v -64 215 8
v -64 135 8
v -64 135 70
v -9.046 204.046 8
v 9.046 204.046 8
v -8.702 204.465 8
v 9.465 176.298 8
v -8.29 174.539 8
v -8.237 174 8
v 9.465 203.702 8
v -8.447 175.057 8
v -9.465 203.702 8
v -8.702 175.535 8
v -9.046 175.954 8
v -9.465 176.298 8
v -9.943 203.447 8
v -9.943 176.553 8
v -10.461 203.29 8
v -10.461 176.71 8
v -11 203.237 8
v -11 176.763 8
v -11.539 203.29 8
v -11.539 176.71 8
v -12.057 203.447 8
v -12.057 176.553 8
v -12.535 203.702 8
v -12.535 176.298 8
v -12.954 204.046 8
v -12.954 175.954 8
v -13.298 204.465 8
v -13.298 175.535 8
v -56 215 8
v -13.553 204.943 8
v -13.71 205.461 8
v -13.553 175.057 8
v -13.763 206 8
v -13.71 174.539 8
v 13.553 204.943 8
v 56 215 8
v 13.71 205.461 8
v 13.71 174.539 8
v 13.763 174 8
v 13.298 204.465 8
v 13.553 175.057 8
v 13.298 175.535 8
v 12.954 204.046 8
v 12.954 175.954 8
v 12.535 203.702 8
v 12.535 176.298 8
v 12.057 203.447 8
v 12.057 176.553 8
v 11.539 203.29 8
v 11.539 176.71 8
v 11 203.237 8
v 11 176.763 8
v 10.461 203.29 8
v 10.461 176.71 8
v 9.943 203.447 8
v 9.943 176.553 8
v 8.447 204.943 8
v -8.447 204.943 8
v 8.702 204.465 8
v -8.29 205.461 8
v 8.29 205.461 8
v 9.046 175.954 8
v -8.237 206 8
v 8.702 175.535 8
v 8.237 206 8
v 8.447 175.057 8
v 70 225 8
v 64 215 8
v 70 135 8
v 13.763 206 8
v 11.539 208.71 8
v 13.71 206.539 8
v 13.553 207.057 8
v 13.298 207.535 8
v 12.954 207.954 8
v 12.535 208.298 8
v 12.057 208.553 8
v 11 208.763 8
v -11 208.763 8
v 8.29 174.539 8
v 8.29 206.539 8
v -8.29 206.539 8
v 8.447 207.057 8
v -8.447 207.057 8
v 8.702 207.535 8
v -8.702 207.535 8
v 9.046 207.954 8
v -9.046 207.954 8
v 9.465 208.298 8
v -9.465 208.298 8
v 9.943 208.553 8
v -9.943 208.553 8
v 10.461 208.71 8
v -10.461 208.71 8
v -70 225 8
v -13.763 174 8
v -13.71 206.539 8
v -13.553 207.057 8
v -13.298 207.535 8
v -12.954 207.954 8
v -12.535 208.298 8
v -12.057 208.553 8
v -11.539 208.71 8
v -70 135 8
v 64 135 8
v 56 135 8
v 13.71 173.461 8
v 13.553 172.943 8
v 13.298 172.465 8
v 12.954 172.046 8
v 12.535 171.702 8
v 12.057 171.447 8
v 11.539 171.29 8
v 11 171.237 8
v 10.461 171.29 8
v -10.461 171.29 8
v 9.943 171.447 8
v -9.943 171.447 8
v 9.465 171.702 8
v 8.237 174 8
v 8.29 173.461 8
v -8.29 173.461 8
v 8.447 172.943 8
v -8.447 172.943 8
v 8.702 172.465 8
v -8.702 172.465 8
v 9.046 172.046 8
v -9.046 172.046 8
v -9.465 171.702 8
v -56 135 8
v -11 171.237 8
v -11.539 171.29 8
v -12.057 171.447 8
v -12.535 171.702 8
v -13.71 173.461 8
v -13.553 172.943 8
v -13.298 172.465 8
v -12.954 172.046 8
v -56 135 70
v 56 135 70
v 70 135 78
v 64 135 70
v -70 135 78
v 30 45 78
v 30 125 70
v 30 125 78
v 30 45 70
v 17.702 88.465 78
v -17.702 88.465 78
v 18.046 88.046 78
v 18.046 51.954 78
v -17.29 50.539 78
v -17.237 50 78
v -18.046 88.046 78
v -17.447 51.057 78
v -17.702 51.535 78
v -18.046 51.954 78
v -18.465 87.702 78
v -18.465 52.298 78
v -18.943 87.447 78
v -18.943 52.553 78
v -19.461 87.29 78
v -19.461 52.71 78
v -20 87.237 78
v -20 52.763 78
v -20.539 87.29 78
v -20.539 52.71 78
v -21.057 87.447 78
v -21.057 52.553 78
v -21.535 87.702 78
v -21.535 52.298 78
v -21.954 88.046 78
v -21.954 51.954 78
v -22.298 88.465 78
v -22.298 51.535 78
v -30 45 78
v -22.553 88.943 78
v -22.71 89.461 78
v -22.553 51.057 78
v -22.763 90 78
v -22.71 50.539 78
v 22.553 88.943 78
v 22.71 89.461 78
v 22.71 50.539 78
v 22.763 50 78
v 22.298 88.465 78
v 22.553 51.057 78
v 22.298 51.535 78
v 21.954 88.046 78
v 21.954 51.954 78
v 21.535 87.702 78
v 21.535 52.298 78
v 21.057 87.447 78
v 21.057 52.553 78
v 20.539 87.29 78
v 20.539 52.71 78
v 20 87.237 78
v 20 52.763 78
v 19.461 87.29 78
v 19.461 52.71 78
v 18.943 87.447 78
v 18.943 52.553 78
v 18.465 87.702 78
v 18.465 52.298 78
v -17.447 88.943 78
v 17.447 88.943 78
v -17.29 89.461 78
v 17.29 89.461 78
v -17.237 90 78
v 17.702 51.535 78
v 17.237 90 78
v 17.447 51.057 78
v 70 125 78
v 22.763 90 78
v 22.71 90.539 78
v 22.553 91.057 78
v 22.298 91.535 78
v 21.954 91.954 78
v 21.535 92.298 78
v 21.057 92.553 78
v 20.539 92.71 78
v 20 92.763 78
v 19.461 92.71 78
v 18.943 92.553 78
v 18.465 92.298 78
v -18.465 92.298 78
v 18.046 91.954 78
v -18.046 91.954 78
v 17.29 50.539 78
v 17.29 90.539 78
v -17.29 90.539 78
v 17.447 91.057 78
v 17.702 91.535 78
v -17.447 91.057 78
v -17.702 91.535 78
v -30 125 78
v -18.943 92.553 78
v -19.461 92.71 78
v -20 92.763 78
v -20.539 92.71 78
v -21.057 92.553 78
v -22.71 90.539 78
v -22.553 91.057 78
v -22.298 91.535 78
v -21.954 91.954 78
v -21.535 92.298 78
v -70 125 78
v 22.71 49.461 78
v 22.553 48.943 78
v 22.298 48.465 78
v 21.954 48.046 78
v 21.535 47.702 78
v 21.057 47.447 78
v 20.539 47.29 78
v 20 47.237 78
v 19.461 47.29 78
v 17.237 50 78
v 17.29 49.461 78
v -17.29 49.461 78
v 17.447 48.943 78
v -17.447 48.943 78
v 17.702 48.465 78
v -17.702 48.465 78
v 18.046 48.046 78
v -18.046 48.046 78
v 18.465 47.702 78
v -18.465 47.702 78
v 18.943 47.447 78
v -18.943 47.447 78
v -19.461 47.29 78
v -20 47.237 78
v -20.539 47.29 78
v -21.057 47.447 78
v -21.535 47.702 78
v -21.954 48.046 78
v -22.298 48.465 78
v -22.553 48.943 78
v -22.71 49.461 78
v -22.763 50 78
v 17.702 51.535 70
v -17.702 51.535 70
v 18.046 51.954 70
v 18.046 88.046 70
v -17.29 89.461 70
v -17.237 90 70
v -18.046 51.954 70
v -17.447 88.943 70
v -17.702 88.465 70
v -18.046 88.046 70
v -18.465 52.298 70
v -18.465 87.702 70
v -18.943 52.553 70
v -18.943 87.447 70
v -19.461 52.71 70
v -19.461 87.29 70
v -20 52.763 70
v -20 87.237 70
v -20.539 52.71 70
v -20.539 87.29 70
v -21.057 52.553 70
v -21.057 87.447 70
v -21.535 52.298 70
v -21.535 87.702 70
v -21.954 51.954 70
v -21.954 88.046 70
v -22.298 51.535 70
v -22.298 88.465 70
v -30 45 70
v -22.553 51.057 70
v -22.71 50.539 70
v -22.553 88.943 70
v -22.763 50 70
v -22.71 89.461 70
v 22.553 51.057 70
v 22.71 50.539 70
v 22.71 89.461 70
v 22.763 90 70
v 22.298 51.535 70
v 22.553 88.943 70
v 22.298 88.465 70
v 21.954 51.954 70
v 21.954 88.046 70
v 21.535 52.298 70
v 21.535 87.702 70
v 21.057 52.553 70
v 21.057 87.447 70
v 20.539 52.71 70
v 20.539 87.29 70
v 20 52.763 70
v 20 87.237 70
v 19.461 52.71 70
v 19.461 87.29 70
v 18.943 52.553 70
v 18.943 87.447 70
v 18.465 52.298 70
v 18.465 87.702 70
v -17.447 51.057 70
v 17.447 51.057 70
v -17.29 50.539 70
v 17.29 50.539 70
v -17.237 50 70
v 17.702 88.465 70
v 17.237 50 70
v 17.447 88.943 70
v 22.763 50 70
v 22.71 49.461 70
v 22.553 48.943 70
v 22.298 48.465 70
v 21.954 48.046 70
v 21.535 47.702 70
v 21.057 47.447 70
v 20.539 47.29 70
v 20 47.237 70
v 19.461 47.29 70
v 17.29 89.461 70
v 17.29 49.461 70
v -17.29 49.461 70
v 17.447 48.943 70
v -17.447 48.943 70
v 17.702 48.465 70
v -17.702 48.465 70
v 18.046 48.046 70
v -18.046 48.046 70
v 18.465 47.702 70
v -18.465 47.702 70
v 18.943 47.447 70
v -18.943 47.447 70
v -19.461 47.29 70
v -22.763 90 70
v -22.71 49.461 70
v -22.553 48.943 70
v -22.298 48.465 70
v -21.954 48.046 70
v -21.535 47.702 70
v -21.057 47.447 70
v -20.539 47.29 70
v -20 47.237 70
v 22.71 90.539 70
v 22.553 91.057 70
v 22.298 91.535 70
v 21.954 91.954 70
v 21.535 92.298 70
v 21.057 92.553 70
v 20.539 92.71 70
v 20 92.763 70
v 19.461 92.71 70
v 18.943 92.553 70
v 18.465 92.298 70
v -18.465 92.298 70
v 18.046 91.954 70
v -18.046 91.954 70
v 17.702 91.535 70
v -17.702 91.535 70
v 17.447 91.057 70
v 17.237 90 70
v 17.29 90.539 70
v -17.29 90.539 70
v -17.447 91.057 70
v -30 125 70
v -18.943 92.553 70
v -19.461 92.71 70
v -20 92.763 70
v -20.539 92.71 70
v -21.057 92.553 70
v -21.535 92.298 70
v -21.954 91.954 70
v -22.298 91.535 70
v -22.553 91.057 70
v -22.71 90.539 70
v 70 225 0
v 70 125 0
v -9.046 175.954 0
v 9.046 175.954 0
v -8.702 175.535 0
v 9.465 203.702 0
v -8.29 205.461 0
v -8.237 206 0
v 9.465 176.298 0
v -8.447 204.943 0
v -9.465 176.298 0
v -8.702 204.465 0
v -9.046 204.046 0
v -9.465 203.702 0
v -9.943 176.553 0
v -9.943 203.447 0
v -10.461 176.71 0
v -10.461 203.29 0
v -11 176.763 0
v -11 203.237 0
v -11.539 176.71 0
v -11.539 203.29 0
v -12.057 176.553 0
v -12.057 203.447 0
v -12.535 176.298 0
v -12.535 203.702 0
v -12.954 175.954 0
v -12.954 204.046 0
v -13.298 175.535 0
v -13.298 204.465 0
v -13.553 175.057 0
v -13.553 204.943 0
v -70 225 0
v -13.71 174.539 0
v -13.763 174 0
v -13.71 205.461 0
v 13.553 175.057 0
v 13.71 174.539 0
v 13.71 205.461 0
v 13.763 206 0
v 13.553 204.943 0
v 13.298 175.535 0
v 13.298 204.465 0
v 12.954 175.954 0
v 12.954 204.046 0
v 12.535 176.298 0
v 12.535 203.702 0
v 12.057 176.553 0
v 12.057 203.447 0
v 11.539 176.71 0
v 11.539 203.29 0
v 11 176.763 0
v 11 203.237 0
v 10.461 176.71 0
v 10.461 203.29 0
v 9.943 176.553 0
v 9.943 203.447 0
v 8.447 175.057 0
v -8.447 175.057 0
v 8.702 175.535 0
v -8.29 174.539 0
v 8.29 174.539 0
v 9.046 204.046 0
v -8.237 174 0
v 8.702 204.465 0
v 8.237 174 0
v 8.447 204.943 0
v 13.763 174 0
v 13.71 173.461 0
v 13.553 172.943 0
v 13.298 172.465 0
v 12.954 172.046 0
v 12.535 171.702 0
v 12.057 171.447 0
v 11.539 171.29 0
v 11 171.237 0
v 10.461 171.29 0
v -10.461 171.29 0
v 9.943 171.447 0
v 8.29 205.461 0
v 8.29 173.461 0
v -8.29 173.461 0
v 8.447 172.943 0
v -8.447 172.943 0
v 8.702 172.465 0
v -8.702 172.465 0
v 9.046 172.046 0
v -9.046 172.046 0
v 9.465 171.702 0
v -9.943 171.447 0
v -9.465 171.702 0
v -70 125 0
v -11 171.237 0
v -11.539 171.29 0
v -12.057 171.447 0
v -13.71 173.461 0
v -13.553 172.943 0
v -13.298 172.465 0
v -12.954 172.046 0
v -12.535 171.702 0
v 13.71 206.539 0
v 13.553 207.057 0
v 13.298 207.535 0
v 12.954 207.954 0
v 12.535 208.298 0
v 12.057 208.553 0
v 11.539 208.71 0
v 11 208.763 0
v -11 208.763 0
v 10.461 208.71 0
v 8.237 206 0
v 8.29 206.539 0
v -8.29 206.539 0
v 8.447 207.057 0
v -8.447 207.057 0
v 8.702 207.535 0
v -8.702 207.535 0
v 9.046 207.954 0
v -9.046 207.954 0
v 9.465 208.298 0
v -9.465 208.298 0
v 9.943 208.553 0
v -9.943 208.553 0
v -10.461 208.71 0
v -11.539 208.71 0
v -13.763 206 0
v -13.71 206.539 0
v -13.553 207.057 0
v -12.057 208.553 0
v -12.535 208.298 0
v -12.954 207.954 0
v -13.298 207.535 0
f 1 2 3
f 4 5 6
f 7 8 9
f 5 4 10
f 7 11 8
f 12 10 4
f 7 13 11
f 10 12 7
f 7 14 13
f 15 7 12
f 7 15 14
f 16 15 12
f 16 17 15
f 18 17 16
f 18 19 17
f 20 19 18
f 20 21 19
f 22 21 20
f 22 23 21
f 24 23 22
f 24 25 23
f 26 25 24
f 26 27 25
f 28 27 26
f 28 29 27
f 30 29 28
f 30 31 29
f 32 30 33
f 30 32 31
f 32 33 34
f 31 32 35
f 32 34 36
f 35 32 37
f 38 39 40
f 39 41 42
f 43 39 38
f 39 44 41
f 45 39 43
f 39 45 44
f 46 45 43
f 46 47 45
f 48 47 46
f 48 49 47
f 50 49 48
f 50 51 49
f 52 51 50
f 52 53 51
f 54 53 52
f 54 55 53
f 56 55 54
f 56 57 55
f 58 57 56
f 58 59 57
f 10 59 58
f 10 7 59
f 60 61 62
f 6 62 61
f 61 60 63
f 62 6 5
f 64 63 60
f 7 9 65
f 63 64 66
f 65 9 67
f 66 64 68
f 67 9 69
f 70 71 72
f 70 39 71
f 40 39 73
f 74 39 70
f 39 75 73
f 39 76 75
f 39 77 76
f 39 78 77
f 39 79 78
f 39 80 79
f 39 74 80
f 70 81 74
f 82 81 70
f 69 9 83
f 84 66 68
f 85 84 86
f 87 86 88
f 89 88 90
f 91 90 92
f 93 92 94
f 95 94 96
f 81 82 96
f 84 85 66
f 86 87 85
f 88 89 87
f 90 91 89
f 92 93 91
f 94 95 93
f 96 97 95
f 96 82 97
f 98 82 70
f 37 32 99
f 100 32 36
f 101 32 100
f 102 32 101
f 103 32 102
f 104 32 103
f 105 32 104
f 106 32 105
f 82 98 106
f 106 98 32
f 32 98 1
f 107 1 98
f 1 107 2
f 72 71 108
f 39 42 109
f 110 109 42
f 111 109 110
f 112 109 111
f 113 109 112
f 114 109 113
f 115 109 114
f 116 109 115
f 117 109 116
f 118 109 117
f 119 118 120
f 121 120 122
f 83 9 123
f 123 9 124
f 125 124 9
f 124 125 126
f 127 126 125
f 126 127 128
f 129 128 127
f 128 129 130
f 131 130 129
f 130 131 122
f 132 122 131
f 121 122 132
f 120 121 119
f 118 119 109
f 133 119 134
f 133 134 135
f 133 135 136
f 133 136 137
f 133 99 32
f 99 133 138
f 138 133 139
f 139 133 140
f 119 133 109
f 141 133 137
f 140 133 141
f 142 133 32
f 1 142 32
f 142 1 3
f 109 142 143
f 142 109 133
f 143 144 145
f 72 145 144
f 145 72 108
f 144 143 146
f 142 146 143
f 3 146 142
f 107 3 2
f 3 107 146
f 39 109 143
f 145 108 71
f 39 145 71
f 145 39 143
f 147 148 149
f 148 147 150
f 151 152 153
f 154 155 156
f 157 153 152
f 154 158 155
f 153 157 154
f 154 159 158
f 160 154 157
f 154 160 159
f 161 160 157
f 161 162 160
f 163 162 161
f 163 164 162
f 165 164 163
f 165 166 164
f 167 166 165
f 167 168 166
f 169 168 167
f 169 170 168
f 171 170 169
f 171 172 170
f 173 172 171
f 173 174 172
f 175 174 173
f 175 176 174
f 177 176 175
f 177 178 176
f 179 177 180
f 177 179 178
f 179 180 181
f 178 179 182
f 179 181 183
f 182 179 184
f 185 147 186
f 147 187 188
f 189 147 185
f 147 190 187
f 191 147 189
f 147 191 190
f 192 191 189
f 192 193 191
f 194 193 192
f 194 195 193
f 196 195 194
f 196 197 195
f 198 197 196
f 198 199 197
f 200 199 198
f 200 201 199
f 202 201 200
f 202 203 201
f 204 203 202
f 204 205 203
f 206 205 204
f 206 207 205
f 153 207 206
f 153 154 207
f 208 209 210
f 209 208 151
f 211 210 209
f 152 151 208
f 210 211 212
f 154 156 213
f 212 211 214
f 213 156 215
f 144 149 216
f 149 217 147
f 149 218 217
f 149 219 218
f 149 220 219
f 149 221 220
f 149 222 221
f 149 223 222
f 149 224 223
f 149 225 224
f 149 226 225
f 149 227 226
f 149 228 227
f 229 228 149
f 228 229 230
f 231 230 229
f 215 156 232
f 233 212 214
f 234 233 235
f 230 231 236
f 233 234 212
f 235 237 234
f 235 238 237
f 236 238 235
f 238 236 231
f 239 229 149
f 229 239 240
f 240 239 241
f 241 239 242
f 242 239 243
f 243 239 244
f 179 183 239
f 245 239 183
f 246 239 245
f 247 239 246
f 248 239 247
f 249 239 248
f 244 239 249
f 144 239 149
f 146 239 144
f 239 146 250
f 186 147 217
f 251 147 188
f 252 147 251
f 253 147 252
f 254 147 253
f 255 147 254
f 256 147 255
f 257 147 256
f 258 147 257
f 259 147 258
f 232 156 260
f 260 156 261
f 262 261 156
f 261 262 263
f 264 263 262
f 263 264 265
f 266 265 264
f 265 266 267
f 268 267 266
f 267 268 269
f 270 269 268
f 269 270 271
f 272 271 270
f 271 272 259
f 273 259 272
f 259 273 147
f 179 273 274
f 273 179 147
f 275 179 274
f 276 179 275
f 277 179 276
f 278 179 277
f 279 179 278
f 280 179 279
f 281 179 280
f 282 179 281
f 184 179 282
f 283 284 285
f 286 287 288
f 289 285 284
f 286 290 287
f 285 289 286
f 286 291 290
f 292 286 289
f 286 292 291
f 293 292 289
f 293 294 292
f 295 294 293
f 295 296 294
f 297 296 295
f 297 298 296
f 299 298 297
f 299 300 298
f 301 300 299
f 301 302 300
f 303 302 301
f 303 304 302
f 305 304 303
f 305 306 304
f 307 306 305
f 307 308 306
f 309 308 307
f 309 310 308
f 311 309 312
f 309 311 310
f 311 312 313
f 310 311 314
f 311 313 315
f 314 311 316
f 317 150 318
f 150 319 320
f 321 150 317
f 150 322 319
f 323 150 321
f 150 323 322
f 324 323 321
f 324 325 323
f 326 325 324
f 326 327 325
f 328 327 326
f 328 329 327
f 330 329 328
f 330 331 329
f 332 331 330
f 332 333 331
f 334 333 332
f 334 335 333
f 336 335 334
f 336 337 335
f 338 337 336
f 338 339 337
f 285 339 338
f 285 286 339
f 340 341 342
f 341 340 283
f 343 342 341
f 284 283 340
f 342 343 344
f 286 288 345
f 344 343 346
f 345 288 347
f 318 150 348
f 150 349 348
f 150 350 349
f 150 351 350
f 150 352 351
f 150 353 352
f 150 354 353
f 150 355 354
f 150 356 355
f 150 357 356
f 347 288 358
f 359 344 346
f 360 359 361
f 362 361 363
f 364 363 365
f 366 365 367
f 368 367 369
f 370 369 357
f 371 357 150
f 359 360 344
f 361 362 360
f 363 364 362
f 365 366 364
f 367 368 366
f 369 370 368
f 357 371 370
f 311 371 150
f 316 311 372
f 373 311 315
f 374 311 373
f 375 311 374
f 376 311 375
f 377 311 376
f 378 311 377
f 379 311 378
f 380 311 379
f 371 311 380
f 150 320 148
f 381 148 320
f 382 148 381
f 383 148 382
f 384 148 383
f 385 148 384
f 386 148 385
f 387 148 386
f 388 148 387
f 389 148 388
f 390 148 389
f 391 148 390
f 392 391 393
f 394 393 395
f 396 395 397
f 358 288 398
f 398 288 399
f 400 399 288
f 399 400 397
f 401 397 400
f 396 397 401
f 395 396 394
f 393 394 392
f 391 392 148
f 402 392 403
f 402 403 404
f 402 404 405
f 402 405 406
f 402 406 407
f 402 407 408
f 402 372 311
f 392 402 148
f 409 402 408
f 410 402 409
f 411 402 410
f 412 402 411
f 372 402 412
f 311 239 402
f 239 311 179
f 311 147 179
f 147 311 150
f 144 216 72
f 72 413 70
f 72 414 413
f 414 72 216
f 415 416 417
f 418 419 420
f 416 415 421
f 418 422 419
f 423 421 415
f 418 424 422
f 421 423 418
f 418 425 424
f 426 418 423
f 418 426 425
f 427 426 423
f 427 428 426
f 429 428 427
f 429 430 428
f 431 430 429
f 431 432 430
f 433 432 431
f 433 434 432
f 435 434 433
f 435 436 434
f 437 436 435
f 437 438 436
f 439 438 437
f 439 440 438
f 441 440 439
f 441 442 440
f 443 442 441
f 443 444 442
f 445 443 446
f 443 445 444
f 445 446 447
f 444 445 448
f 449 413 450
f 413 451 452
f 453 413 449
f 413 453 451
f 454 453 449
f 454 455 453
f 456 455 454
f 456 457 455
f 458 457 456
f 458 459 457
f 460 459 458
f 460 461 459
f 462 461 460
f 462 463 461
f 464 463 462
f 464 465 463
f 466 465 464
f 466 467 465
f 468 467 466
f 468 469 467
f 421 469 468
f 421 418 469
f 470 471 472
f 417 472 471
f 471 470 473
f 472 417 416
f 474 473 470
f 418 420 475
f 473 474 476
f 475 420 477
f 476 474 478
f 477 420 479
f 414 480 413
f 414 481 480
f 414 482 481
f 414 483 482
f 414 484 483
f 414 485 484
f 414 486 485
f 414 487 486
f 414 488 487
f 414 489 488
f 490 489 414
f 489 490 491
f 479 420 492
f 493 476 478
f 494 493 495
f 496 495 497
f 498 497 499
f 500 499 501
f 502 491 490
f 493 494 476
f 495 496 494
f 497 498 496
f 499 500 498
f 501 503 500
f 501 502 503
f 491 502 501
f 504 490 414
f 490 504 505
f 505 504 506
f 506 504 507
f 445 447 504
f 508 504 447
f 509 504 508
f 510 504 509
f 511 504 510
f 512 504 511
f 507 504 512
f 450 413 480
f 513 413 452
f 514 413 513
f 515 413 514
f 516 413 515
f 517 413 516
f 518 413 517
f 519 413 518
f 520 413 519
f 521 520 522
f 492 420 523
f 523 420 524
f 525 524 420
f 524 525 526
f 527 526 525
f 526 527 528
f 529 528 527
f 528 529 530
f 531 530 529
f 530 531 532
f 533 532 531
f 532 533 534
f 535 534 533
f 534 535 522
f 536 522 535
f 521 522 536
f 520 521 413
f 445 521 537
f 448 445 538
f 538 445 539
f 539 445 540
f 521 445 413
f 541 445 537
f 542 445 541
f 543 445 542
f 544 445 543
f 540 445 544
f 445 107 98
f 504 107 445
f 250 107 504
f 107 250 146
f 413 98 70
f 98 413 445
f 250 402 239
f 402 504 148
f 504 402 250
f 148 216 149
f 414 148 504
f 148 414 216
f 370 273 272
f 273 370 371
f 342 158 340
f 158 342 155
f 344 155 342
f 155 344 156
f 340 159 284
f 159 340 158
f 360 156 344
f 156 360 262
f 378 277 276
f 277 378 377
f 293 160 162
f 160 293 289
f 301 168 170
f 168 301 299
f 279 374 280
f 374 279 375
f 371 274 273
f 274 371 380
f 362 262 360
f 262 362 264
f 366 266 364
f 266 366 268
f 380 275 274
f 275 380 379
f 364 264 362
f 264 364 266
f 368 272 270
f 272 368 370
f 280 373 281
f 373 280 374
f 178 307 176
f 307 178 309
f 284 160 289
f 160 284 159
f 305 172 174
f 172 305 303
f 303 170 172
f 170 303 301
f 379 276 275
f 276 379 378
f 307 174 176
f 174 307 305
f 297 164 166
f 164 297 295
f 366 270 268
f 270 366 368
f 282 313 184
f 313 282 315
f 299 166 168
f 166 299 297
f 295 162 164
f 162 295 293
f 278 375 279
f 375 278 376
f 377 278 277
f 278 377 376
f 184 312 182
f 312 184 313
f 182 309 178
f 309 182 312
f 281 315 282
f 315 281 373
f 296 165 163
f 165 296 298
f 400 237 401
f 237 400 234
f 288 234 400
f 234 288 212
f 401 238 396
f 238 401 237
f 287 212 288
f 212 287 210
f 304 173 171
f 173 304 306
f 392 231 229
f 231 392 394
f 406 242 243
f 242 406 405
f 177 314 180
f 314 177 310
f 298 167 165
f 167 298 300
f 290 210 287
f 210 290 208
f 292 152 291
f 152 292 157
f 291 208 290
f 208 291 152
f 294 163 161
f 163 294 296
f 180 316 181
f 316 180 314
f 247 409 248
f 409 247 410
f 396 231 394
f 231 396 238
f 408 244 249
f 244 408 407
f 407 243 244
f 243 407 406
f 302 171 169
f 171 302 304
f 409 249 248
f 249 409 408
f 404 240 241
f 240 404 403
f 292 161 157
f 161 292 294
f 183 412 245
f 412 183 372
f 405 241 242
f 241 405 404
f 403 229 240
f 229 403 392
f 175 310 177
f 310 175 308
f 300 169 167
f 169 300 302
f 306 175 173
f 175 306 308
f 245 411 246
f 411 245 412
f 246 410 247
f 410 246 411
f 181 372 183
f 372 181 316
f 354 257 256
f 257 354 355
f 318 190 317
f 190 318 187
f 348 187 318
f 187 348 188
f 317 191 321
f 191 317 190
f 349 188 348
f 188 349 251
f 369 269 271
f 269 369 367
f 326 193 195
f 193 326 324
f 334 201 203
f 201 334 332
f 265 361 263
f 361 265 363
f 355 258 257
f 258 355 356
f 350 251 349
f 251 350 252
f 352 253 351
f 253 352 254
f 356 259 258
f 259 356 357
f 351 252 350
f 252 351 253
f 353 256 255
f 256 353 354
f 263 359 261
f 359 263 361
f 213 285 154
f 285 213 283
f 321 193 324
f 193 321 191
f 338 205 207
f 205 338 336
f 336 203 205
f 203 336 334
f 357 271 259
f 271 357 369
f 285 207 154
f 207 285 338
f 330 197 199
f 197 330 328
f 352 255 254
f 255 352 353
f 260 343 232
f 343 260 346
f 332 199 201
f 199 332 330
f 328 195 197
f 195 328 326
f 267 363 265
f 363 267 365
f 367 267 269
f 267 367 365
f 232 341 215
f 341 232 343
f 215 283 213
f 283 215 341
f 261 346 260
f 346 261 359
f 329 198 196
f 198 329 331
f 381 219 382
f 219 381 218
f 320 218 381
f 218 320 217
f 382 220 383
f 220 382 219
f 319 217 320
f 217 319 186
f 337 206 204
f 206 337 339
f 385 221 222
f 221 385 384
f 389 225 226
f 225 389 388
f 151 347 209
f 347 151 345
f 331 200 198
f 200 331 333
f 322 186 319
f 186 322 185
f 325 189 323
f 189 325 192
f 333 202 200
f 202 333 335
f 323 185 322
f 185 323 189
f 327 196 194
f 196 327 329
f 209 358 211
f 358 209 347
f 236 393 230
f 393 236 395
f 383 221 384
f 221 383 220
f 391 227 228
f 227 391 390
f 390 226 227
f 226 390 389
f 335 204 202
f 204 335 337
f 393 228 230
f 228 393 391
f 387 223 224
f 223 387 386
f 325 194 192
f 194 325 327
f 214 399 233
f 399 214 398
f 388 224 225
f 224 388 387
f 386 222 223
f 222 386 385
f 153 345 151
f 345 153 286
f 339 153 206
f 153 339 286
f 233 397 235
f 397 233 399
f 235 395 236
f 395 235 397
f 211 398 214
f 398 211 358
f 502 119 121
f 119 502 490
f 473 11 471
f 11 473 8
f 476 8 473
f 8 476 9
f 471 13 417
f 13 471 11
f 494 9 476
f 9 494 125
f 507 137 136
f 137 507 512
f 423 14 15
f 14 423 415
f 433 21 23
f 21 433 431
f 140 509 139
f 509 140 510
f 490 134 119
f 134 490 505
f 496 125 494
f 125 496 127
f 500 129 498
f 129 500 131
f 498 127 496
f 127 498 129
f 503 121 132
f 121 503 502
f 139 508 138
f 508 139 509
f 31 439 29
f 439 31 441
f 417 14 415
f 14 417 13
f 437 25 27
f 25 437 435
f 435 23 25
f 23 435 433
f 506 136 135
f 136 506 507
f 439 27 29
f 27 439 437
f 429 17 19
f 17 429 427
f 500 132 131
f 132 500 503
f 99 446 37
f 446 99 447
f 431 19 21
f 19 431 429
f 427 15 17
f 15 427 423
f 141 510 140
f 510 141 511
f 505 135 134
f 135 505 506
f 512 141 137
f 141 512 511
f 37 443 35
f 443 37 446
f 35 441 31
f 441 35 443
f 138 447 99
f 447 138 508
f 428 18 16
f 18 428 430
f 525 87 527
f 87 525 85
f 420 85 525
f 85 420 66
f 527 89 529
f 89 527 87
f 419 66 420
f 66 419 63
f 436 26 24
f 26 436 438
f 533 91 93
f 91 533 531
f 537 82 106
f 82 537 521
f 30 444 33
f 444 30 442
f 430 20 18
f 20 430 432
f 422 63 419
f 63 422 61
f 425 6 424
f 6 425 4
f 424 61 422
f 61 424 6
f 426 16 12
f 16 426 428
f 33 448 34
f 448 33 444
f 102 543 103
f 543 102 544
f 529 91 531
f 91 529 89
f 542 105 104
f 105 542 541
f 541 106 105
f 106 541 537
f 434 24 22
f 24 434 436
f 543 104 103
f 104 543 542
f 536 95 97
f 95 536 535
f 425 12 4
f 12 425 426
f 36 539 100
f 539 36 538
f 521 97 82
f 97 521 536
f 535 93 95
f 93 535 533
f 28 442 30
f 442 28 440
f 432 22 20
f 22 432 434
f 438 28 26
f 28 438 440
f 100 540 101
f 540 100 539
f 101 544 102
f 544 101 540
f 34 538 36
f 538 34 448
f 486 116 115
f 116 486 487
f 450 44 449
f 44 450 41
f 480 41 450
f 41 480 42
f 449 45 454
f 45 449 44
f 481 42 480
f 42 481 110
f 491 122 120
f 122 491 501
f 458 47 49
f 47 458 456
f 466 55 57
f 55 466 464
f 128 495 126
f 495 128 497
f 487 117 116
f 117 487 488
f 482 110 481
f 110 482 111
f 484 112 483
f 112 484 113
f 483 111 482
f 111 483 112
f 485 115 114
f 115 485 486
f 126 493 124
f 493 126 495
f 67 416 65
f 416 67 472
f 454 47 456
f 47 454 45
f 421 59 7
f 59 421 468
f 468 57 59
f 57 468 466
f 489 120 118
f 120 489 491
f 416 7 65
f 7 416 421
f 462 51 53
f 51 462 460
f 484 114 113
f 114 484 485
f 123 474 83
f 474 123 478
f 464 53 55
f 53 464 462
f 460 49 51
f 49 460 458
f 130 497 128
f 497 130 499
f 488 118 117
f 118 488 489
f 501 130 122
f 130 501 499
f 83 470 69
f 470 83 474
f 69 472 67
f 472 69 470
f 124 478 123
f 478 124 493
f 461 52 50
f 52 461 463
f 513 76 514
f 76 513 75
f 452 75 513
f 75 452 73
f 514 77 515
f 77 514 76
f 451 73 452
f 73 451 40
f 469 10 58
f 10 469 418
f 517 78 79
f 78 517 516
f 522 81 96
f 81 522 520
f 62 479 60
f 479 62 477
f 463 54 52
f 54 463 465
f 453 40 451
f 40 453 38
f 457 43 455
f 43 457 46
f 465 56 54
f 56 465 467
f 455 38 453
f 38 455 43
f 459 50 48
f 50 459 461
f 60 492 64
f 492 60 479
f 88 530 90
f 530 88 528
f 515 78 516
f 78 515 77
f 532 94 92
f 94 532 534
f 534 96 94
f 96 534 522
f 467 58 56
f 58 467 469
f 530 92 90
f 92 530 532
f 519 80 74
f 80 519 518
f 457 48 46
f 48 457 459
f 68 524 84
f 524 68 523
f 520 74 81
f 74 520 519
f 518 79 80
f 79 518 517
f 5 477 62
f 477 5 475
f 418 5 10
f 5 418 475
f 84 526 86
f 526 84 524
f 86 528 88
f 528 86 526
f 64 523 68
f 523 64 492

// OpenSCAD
// file: ../../../../../scad/lib/parent_spar_bolted.scad
// Parent modular exterior v2. mm. Geometry shared by individual part wrappers.
// Metal fasteners, ballast, Takachi box and electronics are purchased items.
/* [Dimensions] */
disk_d=225; disk_t=5;
fin_h=125; fin_w=65; fin_t=4;
beam_w=32; clearance=0.5;
float_r=100; flange_r=112.5; float_bore_r=30;
float_wall=4; float_h=180; lid_t=6;
rod_r=105.5; flange_t=6;
hub_h=32; root_x=30; root_depth=14;
$fn=96; e=0.03;
assert(disk_d<=225 && 2*flange_r<=225);
assert(fin_h>=100 && fin_h<=150 && fin_w>=50 && fin_w<=80);
assert(root_x+fin_w<disk_d/2-5);
module bore(d,h) { cylinder(d=d/cos(180/32),h=h,$fn=32); }
module bore_x(d,l) { rotate([0,90,0]) bore(d,l); }
module bore_y(d,l) { rotate([-90,0,0]) bore(d,l); }
module square_bore(h) { translate([-(beam_w+clearance)/2,-(beam_w+clearance)/2,-e]) cube([beam_w+clearance,beam_w+clearance,h+2*e]); }
module rods(h,d=6.5) { for(a=[45:90:315]) rotate([0,0,a]) translate([rod_r,0,-e]) bore(d,h+2*e); }
module lid_bolts(h) { for(a=[22.5:45:359]) rotate([0,0,a]) translate([rod_r,0,-e]) bore(4.5,h+2*e); }
module hub_pin(z) { translate([-46,10,z]) bore_x(6.5,92); }
module disk() {
 difference() { cylinder(d=disk_d,h=disk_t); square_bore(disk_t);
  for(x=[-23,23],y=[-23,23]) translate([x,y,-e]) bore(5.5,disk_t+2*e);
 }
}
module fin() {
 difference() { cube([fin_w,fin_t,fin_h]);
  for(z=[10,fin_h-hub_h+10]) translate([root_depth/2,-e,z]) bore_y(5.5,fin_t+2*e);
 }
}
module hub() {
 difference() {
  union() { translate([-30,-30,0]) cube([60,60,hub_h]);
   for(a=[0:90:270]) rotate([0,0,a]) translate([28,-16,0]) cube([16,32,hub_h]);
  }
  square_bore(hub_h);
  for(a=[0:90:270]) rotate([0,0,a]) {
   translate([root_x-clearance/2,-(fin_t+clearance)/2,-e]) cube([root_depth+clearance,fin_t+clearance,hub_h+2*e]);
   translate([root_x+root_depth/2,-17,10]) bore_y(5.5,34);
  }
  for(x=[-23,23],y=[-23,23]) translate([x,y,-e]) bore(5.5,hub_h+2*e);
  hub_pin(24);
 }
}
module beam(lower=true) {
 len=lower?180:107;
 difference() { translate([-beam_w/2,-beam_w/2,0]) cube([beam_w,beam_w,len]);
  if(lower) { for(z=[24,117]) hub_pin(z); translate([-20,0,160]) bore_x(6.5,40); translate([0,0,-e]) bore(16,8); }
  else for(z=[20,87]) translate([-20,0,z]) bore_x(6.5,40);
 }
}
module coupler() {
 // One half of a screwed split coupler. Mirror Y for the second half.
 difference() { translate([-27,0.25,0]) cube([54,26.75,64]); square_bore(64);
  for(z=[12,52]) translate([-28,0,z]) bore_x(6.5,56);
  for(x=[-22,22],z=[24,40]) translate([x,-1,z]) bore_y(5.5,29);
 }
}
module float_body() {
 difference() {
  union() { cylinder(r=float_r,h=float_h);
   translate([0,0,float_h-flange_t]) cylinder(r=flange_r,h=flange_t);
   // 45-degree underside of the flange instead of a 15 mm unsupported ledge.
   translate([0,0,float_h-flange_t-(flange_r-float_r)]) cylinder(r1=float_r,r2=flange_r,h=flange_r-float_r);
  }
  translate([0,0,-e]) cylinder(r=float_bore_r,h=float_h+2*e);
  translate([0,0,float_wall]) difference() {
   cylinder(r=float_r-float_wall,h=float_h);
   cylinder(r=float_bore_r+float_wall,h=float_h+e);
  }
  // Coupling-nut clearance; nearest cavity wall remains >=3 mm thick.
  rods(float_h,13); lid_bolts(float_h);
  for(a=[22.5:45:359]) rotate([0,0,a]) translate([rod_r,0,-e]) bore(10,float_h-flange_t+e);
 }
}
module float_lid() {
 difference() {
  cylinder(r=flange_r,h=lid_t);
  translate([0,0,-e]) cylinder(r=float_bore_r,h=lid_t+2*e);
  rods(lid_t,13); lid_bolts(lid_t);
  // Continuous face seals: 2 mm cord, 2.4 wide x 1.5 deep grooves.
  for(r=[float_bore_r+float_wall/2,float_r-float_wall/2]) translate([0,0,-e]) difference() {
   cylinder(r=r+1.2,h=1.5+e); cylinder(r=r-1.2,h=1.5+2*e);
  }
 }
}
module float_end(top=true) {
 difference() {
  union() { cylinder(r=flange_r,h=8);
   if(top) translate([-30,-30,8-e]) cube([60,60,20+e]);
   else translate([-23,-23,-40]) cube([46,46,40+e]);
  }
  rods(8);
  if(top) for(x=[-20,20],y=[-20,20]) {
   translate([x,y,-e]) bore(5.5,29);
   translate([x,y,-e]) bore(11,18+e);
  }
  if(top) for(a=[22.5:45:359]) rotate([0,0,a]) translate([rod_r,0,-e]) bore(12,8+2*e);
  else { translate([0,0,-40]) square_bore(40-e);
   translate([-24,0,-20]) bore_x(6.5,48);
  }
 }
}
module ballast_body() {
 // Open upward in print orientation. In the assembly this cup is inverted.
 difference() {
  union() { cylinder(r=45,h=51); translate([0,0,45]) cylinder(r=60,h=6);
   translate([0,0,30]) cylinder(r1=45,r2=60,h=15);
  }
  translate([0,0,6]) cylinder(r=40,h=46);
  for(x=[-23,23],y=[-23,23]) translate([x,y,-e]) bore(5.5,7);
  translate([0,0,-e]) bore(8.5,7);
  for(a=[0:90:270]) rotate([0,0,a]) translate([52,0,29]) { bore(5.5,23); bore(12,16); }
 }
}
module ballast_lid() {
 difference() { cylinder(r=60,h=6);
  for(a=[0:90:270]) rotate([0,0,a]) translate([52,0,-e]) bore(5.5,7);
  // Flooded ballast compartment: drainage, no trapped air assumption.
  for(x=[-20,0,20]) translate([x,0,-e]) bore(6,7);
 }
}
module camera_bridge() {
 // Assembly frame: local top z=78; camera seat z=8. +Y faces camera front.
 difference() {
  union() {
   translate([-30,45,70]) cube([60,90,8]);
   translate([-70,125,0]) cube([140,100,8]);
   translate([-70,125,0]) cube([140,10,78]);
   for(x=[-64,56]) translate([x,0,0]) rotate([90,0,90]) linear_extrude(8)
    polygon([[135,8],[215,8],[135,70]]);
  }
  for(x=[-20,20],y=[50,90]) translate([x,y,69]) bore(5.5,10);
  for(x=[-11,11],y=[174,206]) translate([x,y,-e]) bore(5.5,10);
 }
}
module gps_bridge() {
 // Local attachment face X=0 at deck +X; top shelf z=175.
 difference() {
  union() { translate([0,-25,0]) cube([10,50,183]);
   translate([-90,-48,175]) cube([100,96,8]);
   for(y=[-17,25]) translate([0,y,0]) rotate([90,0,0]) linear_extrude(8)
    polygon([[e,155],[e,175+e],[-80,175+e]]);
  }
  for(y=[-20,20],z=[5,45]) translate([-e,y,z]) bore_x(5.5,11);
  for(y=[-34,34]) translate([-43,y,174]) bore(4.5,10);
 }
}
// Reference antenna envelope, correct mounting ears, not a printable antenna.
module gps_reference() {
 difference() {
  union() { translate([-30,-28,0]) cube([60,56,22.5]);
   translate([-10,-41,0]) cube([20,82,6]); }
  for(y=[-34,34]) translate([0,y,-e]) bore(4.5,7);
 }
}
// main file
// mm. part=print is the intended X1C orientation.
part="assembly"; // [assembly,print]
use <../../../../../scad/lib/parent_spar_bolted.scad>
if(part=="print") { translate([0,0,225]) rotate([-90,0,0]) camera_bridge(); } else { camera_bridge(); }
